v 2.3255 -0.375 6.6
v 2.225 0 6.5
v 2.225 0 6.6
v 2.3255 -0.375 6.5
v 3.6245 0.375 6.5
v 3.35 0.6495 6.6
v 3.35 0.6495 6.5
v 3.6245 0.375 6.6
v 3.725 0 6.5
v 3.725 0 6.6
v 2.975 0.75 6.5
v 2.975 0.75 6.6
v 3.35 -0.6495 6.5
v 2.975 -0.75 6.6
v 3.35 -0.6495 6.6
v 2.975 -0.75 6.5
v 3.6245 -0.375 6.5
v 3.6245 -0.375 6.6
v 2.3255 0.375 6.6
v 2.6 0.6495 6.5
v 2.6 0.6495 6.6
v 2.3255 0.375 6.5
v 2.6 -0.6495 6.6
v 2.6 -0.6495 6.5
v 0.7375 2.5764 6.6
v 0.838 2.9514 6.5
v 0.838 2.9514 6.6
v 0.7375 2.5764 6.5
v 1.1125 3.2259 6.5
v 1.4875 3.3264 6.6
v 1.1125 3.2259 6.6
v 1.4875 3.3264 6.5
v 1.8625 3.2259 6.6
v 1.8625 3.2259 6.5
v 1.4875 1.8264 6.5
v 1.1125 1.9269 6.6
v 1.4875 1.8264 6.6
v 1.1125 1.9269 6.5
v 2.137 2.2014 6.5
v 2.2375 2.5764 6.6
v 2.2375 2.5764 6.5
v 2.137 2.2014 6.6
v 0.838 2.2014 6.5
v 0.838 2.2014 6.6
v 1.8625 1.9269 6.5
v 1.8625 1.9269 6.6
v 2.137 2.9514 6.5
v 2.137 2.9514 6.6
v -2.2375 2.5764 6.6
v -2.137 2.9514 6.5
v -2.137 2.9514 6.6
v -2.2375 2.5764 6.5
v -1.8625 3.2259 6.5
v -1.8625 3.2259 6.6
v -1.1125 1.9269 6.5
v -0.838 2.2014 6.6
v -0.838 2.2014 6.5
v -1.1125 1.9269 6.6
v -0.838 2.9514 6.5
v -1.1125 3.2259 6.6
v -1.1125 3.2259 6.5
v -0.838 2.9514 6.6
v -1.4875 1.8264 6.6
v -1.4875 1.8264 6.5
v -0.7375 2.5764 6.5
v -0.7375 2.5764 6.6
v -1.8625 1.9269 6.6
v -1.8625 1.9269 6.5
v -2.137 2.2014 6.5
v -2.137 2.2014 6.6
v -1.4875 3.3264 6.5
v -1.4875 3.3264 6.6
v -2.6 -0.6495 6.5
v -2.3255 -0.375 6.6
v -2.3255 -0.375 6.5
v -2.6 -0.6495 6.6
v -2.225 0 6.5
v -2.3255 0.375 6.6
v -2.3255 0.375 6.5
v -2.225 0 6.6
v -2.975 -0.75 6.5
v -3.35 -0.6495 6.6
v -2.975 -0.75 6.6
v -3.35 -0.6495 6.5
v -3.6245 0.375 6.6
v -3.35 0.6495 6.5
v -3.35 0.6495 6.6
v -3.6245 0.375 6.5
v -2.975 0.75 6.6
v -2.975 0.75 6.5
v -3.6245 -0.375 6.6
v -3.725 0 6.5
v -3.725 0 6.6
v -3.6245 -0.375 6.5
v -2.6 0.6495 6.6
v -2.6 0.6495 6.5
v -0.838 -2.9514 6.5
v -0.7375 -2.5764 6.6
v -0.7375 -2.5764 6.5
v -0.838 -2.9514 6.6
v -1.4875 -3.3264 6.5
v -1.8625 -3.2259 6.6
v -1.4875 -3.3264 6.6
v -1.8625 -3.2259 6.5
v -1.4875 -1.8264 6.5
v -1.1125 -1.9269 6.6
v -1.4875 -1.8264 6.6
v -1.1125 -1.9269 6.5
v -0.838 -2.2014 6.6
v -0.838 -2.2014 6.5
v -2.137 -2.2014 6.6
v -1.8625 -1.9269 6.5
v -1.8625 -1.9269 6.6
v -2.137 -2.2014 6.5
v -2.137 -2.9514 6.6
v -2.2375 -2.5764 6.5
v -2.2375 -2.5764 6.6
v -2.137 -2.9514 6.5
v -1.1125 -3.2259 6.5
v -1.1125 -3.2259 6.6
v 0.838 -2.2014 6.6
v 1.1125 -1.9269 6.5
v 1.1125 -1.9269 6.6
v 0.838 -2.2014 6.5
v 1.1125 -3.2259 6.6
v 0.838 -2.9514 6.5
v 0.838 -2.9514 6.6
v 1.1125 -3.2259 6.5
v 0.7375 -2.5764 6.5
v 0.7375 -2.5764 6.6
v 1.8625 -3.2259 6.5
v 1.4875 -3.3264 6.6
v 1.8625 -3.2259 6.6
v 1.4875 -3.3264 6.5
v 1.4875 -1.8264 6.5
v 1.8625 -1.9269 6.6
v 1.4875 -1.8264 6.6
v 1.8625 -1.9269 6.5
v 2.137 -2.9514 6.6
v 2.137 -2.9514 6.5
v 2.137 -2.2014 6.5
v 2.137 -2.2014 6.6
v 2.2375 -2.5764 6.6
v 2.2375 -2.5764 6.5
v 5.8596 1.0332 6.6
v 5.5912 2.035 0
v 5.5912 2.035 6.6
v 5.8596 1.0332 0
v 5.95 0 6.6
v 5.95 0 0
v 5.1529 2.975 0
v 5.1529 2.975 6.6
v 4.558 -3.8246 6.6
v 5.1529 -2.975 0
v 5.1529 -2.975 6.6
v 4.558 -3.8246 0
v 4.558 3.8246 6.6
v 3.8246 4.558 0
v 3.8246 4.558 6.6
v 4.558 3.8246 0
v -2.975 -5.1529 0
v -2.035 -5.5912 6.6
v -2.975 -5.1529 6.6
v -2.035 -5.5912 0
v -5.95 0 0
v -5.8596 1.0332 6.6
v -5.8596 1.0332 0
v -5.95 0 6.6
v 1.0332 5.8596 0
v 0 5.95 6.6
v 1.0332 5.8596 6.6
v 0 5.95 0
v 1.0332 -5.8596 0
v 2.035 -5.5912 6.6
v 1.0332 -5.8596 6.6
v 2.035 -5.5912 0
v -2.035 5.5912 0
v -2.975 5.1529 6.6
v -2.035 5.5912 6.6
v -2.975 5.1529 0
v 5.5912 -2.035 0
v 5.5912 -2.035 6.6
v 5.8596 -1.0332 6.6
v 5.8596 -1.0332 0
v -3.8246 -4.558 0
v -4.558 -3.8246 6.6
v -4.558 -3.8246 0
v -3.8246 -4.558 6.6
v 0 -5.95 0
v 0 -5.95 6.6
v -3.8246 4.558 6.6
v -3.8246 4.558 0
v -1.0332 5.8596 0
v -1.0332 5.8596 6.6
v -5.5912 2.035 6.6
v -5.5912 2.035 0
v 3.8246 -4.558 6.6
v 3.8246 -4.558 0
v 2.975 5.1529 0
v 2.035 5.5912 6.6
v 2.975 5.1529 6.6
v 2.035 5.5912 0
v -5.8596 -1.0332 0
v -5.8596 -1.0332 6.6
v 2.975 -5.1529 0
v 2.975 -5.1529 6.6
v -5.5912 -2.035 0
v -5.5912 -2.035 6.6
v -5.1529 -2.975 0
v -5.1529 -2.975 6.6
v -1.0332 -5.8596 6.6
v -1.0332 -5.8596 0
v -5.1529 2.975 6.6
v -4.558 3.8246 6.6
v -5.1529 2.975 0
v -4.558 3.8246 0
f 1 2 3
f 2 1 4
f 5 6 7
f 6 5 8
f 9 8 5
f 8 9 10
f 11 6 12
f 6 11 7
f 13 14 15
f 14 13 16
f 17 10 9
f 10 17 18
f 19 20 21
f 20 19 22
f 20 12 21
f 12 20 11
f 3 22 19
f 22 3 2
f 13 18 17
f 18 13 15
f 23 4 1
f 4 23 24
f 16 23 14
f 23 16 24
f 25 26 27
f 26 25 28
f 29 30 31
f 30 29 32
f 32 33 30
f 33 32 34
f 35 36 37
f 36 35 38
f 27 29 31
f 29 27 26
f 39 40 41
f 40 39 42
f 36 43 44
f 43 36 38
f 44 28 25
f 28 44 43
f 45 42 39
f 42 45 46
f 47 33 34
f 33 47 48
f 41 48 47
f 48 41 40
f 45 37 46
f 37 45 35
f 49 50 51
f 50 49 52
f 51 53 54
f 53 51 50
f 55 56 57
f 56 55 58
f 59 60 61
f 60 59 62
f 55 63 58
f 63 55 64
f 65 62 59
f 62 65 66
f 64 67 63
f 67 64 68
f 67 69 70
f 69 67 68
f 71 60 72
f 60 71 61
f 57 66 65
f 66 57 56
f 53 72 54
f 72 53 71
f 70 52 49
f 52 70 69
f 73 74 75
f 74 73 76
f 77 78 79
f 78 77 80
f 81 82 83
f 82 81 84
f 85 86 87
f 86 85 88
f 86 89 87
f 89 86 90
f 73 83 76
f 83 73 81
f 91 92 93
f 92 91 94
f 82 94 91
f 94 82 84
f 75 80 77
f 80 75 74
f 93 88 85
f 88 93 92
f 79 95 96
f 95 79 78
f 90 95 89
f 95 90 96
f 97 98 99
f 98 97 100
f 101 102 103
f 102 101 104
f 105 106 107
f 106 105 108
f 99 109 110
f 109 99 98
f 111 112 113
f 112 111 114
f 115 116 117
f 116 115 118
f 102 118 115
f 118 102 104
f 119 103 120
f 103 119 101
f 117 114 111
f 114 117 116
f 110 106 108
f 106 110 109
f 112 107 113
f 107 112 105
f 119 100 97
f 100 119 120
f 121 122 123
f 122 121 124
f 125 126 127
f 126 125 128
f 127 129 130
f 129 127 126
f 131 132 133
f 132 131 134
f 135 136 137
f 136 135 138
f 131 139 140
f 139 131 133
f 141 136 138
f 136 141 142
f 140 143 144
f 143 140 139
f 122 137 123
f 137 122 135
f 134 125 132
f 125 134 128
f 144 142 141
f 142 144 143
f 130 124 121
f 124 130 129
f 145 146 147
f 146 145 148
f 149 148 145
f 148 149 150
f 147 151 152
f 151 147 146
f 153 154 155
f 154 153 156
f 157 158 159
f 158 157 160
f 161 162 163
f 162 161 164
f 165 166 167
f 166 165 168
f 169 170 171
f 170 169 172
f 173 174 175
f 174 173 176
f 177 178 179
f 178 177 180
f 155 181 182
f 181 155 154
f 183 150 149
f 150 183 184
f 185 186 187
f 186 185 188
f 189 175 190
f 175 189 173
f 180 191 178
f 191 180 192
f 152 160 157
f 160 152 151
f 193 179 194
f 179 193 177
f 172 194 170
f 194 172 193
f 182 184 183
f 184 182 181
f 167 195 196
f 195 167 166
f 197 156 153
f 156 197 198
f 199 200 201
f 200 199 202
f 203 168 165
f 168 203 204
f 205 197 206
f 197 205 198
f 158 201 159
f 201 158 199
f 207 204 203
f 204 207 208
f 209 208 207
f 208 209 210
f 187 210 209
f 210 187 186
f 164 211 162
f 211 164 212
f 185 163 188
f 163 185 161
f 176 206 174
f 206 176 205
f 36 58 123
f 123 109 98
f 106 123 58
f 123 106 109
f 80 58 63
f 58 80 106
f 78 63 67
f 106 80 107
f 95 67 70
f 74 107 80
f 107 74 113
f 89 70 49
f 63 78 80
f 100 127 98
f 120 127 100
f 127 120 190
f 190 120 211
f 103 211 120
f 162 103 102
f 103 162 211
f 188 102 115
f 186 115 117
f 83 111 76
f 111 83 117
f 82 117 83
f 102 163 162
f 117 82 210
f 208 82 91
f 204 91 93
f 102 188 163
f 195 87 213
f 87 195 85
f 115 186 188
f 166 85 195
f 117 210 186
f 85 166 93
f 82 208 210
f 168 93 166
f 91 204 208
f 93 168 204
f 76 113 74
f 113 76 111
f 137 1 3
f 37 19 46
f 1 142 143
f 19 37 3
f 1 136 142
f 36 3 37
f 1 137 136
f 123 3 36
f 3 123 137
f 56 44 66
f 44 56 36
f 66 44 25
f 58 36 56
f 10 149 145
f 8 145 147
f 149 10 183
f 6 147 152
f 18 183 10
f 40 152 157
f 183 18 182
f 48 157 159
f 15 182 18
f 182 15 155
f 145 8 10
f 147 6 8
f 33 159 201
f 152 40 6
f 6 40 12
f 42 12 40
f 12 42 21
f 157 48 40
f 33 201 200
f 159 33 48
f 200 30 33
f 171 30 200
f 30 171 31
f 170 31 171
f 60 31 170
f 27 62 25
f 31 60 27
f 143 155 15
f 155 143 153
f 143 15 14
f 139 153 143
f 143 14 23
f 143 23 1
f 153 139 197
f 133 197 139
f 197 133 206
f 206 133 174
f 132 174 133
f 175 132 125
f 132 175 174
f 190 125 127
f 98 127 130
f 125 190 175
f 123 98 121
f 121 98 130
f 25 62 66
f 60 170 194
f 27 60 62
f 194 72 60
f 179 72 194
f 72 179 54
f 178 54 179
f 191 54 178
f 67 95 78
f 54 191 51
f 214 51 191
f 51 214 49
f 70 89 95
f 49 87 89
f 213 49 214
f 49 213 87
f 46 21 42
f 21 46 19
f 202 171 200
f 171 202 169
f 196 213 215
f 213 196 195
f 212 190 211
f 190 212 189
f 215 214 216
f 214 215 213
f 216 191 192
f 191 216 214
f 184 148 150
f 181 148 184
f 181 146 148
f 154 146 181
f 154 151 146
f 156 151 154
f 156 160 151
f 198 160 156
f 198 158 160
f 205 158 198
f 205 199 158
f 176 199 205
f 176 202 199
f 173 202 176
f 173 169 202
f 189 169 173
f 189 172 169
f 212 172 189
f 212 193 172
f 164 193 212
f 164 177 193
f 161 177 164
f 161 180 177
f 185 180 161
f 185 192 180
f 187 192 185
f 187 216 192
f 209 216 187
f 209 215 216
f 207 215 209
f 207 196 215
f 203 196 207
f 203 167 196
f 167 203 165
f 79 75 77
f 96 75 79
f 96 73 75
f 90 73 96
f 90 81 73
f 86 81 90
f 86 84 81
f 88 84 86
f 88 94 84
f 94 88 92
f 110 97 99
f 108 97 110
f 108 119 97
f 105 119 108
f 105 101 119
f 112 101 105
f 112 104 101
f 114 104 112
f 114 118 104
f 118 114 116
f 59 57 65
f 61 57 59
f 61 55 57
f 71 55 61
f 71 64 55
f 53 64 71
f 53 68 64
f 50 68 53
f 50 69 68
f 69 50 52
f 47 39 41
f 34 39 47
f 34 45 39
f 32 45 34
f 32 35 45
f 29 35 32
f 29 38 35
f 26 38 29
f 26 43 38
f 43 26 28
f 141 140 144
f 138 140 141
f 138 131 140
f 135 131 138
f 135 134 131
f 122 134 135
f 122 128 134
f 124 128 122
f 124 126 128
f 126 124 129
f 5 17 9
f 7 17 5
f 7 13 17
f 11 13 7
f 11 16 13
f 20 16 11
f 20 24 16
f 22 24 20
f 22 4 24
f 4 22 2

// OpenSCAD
// =============================================================================
// Piezo Buzzer PS1240 - Reference Model
// For fitment verification only - not for printing
// =============================================================================

// Include parameters (safe to include multiple times)
include <../parameters.scad>

module piezo_buzzer() {
    color([0.1, 0.1, 0.1]) {
        // Main cylindrical body
        cylinder(h=piezo_height, d=piezo_diameter, $fn=36);

        // Sound emission hole pattern on top
        translate([0, 0, piezo_height - 0.1])
        difference() {
            cylinder(h=0.2, d=piezo_diameter, $fn=36);
            for (i = [0:5]) {
                rotate([0, 0, i * 60])
                translate([piezo_diameter/4, 0, -0.1])
                    cylinder(h=0.4, d=1.5, $fn=12);
            }
        }
    }

    // Wire leads
    color([1, 0, 0])
    translate([-2, 0, 0])
        cylinder(h=0.5, d=0.8, $fn=8);

    color([0, 0, 0])
    translate([2, 0, 0])
        cylinder(h=0.5, d=0.8, $fn=8);
}

// Preview (renders when opening this file directly)
piezo_buzzer();
